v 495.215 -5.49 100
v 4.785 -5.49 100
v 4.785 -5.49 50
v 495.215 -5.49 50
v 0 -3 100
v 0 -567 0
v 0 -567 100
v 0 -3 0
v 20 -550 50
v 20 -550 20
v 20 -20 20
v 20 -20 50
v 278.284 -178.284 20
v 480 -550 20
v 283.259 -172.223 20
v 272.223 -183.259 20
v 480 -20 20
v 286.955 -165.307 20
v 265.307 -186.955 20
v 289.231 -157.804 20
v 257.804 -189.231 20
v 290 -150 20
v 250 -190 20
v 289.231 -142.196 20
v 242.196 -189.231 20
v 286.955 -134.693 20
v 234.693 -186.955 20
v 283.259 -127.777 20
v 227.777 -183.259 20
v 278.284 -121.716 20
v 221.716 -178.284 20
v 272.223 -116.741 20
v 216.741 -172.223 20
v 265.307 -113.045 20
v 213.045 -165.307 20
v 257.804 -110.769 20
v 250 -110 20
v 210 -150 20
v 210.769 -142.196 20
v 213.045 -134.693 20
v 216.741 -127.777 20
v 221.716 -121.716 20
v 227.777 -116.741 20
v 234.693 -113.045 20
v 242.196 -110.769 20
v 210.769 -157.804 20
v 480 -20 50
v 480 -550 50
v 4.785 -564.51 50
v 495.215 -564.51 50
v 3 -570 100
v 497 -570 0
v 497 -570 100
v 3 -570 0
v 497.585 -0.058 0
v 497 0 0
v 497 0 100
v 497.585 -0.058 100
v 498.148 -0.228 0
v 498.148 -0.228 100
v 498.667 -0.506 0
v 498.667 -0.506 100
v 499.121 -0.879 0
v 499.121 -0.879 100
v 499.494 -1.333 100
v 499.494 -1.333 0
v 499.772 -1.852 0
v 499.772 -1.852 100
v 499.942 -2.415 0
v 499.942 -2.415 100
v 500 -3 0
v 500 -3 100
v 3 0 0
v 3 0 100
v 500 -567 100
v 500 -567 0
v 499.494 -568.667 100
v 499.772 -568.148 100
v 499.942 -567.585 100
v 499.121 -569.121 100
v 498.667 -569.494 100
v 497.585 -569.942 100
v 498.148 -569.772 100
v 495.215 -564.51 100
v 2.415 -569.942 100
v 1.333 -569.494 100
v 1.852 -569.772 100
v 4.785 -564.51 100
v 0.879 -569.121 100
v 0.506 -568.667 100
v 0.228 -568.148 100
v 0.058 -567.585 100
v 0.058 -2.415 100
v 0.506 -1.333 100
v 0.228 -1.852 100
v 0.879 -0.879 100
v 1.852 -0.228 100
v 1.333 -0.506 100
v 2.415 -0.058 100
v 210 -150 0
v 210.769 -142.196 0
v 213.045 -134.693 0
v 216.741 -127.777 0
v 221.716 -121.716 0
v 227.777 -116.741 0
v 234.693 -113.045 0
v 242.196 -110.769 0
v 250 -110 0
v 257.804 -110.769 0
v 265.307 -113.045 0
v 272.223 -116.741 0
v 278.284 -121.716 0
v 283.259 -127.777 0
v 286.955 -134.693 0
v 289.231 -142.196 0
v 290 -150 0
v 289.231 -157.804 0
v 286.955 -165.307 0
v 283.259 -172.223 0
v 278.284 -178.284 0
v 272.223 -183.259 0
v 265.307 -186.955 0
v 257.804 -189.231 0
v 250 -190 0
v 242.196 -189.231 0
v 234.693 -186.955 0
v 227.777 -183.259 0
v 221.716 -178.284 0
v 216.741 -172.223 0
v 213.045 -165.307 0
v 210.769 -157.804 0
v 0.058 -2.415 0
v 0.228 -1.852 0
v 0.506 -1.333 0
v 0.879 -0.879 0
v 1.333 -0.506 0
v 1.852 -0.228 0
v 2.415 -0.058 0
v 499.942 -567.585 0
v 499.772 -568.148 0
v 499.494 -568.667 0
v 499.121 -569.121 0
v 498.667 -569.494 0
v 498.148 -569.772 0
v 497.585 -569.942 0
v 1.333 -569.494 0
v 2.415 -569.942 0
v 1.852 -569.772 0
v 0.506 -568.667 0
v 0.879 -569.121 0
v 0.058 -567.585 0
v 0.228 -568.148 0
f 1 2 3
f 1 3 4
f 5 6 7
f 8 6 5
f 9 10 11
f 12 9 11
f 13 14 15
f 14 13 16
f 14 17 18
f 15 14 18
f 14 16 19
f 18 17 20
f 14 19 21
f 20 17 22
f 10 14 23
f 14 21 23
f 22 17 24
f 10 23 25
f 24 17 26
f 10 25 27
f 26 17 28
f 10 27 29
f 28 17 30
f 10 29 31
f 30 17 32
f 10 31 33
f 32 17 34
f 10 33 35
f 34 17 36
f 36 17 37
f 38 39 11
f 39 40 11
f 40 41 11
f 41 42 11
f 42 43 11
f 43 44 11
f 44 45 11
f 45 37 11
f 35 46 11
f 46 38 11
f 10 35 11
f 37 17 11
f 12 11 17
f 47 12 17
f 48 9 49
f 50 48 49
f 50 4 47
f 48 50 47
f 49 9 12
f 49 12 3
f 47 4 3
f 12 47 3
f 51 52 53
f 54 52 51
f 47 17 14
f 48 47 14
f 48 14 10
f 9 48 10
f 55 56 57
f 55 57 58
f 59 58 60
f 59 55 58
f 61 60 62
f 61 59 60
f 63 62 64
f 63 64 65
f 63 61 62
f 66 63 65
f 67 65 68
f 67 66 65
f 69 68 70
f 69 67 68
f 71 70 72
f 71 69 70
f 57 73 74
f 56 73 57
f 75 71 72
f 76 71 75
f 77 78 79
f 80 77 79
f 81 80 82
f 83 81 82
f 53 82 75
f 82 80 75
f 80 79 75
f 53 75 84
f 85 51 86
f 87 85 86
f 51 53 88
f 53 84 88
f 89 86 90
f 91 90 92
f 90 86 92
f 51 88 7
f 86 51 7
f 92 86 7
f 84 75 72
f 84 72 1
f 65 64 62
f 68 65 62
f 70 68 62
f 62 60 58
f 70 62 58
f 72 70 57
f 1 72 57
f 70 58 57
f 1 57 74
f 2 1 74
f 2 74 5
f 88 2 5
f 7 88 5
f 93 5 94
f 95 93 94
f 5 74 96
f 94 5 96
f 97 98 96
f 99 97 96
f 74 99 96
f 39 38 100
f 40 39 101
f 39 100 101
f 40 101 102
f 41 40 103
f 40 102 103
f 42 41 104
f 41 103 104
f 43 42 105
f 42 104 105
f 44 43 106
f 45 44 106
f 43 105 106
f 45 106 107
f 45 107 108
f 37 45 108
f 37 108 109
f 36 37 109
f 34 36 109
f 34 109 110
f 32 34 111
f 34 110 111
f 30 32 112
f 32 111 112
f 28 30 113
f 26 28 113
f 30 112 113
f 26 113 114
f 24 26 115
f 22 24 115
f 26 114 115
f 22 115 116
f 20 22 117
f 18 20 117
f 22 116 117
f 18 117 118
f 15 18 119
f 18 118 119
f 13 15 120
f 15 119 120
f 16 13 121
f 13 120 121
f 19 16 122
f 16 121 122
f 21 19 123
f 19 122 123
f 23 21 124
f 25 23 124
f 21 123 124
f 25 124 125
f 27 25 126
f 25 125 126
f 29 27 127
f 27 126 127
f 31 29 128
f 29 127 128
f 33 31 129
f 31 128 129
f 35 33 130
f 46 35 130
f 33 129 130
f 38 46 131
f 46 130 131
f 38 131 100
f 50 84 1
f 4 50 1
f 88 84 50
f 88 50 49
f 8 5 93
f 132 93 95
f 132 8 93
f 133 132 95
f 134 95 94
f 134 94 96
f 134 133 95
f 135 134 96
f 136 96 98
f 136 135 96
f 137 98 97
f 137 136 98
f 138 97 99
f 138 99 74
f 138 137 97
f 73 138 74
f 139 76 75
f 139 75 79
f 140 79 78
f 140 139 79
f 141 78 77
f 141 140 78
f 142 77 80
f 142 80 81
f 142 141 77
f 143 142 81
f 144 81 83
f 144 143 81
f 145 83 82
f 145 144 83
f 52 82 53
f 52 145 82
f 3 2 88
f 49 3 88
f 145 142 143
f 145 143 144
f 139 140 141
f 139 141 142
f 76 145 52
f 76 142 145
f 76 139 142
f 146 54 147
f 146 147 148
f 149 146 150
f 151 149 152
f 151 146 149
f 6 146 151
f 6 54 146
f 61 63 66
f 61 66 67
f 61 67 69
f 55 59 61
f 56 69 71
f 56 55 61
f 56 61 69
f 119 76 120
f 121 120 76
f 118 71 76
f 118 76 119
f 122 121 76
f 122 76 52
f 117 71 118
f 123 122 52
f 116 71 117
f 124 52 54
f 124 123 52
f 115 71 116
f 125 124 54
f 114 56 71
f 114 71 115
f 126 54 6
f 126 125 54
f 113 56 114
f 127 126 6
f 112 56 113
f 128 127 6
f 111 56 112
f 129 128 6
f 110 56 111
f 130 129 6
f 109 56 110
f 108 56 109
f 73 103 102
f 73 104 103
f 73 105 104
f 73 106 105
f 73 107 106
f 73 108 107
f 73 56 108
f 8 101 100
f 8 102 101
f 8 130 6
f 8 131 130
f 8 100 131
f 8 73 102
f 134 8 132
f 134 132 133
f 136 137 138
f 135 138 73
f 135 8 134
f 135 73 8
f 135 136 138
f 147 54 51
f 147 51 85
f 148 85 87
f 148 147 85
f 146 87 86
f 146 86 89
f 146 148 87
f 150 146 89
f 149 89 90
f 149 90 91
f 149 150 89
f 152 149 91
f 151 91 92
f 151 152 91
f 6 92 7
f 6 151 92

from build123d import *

# Parameters (mm, degrees)
EXTRUDE_1_DEPTH     = 100
SHELL_1_T           = -20
CUT_EXTRUDE_1_DEPTH = 50
SKETCH_3_R          = 60
CUT_EXTRUDE_2_DEPTH = 50
SKETCH_5_R          = 60
SKETCH_5_R_2        = 40
EXTRUDE_2_DEPTH     = 20


with BuildPart() as part:
    # 草图1 → 凸台-拉伸1 (new body)
    with BuildSketch(Plane.XY):
        with BuildLine():
            Line((3, 0), (497, 0))
            ThreePointArc((497, 0), (499.121320344, -0.878679656), (500, -3))
            Line((500, -3), (500, -567))
            ThreePointArc((500, -567), (499.121320344, -569.121320344), (497, -570))
            Line((497, -570), (3, -570))
            ThreePointArc((3, -570), (0.878679656, -569.121320344), (0, -567))
            Line((0, -567), (0, -3))
            ThreePointArc((0, -3), (0.878679656, -0.878679656), (3, 0))
        make_face()
    extrude(amount=EXTRUDE_1_DEPTH)

    # 抽壳1
    shell_1_openings = [part.faces().sort_by_distance(p)[0] for p in [
        (250, -285, 100),
    ]]
    offset(amount=SHELL_1_T, openings=shell_1_openings, kind=Kind.INTERSECTION)

    # 草图2 → 切除-拉伸1 (cut)
    with BuildSketch(Plane.XY.offset(100)):
        Polygon((4.785, -5.49), (495.215, -5.49), (495.215, -20), (495.215, -550), (495.215, -564.51), (4.785, -564.51), (4.785, -550), (4.785, -20), align=None)
    extrude(amount=-CUT_EXTRUDE_1_DEPTH, mode=Mode.SUBTRACT)

    # 草图3 → 切除-拉伸2 (cut)
    with BuildSketch(Plane(origin=(0, 0, 0), x_dir=(-1, 0, 0), z_dir=(0, 0, -1))):
        with Locations((-250, -150)):
            Circle(SKETCH_3_R)
    extrude(amount=-CUT_EXTRUDE_2_DEPTH, mode=Mode.SUBTRACT)

    # 草图5 → 凸台-拉伸2 (add)
    with BuildSketch(Plane(origin=(0, 0, 0), x_dir=(-1, 0, 0), z_dir=(0, 0, -1))):
        with Locations((-250, -150)):
            Circle(SKETCH_5_R)
        with Locations((-250, -150)):
            Circle(SKETCH_5_R_2, mode=Mode.SUBTRACT)
    extrude(amount=-EXTRUDE_2_DEPTH)


solid = part.part
